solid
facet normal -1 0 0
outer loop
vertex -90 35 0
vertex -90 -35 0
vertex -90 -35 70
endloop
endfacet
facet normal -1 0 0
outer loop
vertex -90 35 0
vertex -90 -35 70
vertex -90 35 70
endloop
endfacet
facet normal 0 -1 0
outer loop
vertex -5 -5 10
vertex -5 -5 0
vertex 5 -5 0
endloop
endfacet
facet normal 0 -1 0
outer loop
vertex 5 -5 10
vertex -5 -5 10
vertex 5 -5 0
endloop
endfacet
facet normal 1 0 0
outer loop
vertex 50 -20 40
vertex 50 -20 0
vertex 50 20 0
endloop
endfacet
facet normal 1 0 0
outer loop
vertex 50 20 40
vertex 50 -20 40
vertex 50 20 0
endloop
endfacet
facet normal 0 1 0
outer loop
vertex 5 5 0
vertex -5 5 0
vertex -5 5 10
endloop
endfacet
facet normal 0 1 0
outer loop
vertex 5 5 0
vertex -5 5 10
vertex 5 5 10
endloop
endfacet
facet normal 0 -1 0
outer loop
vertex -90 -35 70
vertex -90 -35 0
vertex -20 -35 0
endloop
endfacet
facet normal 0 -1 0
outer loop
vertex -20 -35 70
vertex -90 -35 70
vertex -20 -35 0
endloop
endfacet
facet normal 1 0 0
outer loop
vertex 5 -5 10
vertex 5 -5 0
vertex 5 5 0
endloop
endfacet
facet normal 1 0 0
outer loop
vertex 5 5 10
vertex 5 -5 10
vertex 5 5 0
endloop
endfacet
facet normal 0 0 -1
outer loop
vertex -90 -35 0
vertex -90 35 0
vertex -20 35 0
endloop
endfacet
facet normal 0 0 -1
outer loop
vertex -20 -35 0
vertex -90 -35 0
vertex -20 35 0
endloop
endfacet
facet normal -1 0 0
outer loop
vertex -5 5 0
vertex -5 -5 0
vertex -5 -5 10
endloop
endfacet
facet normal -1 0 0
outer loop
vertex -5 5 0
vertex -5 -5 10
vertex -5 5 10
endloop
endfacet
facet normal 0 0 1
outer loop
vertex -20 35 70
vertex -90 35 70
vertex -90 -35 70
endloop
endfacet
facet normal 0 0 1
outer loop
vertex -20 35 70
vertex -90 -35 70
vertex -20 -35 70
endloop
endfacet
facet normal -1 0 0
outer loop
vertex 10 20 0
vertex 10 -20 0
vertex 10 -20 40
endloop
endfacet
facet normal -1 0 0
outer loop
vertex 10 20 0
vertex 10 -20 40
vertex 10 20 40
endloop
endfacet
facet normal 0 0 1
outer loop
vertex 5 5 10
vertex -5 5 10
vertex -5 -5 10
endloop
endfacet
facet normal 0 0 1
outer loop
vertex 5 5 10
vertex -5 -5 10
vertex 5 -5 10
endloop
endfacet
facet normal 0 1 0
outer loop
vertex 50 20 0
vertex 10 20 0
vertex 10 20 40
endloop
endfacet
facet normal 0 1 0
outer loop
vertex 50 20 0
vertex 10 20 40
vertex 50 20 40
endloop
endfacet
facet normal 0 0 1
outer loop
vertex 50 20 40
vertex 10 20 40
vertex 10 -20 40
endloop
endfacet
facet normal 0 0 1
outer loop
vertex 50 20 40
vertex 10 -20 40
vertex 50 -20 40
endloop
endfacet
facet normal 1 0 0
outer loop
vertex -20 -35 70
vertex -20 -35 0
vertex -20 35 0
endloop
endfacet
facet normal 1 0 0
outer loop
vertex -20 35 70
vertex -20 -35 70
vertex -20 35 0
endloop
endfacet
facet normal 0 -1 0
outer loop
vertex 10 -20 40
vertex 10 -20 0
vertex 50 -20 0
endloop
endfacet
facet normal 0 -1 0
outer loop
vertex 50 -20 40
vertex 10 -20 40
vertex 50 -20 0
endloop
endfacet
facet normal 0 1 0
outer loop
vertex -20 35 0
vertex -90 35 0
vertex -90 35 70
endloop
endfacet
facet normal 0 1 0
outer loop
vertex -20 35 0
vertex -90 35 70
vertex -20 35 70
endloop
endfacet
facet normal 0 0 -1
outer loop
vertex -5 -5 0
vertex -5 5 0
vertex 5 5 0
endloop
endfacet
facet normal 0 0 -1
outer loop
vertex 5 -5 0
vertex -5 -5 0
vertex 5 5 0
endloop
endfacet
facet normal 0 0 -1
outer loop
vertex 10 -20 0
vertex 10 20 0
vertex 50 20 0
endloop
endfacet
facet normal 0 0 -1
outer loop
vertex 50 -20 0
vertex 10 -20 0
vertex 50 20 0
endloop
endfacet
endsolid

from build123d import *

# Parameters (mm, degrees)
F0_W     = 70
F0_H     = 70
F1_DEPTH = 70
F0_W_2   = 10
F0_H_2   = 10
F2_DEPTH = 10
F0_W_3   = 40
F0_H_3   = 40
F3_DEPTH = 40


with BuildPart() as f1:
    # F0 (on Top) → F1 (new body)
    with BuildSketch(Plane.XY):
        with Locations((-55, 0)):
            Rectangle(F0_W, F0_H)
    extrude(amount=F1_DEPTH)


with BuildPart() as f2:
    # F0 (on Top) → F2 (new body)
    with BuildSketch(Plane.XY):
        Rectangle(F0_W_2, F0_H_2)
    extrude(amount=F2_DEPTH)


with BuildPart() as f3:
    # F0 (on Top) → F3 (new body)
    with BuildSketch(Plane.XY):
        with Locations((30, 0)):
            Rectangle(F0_W_3, F0_H_3)
    extrude(amount=F3_DEPTH)


solid = Compound([f1.part, f2.part, f3.part])
